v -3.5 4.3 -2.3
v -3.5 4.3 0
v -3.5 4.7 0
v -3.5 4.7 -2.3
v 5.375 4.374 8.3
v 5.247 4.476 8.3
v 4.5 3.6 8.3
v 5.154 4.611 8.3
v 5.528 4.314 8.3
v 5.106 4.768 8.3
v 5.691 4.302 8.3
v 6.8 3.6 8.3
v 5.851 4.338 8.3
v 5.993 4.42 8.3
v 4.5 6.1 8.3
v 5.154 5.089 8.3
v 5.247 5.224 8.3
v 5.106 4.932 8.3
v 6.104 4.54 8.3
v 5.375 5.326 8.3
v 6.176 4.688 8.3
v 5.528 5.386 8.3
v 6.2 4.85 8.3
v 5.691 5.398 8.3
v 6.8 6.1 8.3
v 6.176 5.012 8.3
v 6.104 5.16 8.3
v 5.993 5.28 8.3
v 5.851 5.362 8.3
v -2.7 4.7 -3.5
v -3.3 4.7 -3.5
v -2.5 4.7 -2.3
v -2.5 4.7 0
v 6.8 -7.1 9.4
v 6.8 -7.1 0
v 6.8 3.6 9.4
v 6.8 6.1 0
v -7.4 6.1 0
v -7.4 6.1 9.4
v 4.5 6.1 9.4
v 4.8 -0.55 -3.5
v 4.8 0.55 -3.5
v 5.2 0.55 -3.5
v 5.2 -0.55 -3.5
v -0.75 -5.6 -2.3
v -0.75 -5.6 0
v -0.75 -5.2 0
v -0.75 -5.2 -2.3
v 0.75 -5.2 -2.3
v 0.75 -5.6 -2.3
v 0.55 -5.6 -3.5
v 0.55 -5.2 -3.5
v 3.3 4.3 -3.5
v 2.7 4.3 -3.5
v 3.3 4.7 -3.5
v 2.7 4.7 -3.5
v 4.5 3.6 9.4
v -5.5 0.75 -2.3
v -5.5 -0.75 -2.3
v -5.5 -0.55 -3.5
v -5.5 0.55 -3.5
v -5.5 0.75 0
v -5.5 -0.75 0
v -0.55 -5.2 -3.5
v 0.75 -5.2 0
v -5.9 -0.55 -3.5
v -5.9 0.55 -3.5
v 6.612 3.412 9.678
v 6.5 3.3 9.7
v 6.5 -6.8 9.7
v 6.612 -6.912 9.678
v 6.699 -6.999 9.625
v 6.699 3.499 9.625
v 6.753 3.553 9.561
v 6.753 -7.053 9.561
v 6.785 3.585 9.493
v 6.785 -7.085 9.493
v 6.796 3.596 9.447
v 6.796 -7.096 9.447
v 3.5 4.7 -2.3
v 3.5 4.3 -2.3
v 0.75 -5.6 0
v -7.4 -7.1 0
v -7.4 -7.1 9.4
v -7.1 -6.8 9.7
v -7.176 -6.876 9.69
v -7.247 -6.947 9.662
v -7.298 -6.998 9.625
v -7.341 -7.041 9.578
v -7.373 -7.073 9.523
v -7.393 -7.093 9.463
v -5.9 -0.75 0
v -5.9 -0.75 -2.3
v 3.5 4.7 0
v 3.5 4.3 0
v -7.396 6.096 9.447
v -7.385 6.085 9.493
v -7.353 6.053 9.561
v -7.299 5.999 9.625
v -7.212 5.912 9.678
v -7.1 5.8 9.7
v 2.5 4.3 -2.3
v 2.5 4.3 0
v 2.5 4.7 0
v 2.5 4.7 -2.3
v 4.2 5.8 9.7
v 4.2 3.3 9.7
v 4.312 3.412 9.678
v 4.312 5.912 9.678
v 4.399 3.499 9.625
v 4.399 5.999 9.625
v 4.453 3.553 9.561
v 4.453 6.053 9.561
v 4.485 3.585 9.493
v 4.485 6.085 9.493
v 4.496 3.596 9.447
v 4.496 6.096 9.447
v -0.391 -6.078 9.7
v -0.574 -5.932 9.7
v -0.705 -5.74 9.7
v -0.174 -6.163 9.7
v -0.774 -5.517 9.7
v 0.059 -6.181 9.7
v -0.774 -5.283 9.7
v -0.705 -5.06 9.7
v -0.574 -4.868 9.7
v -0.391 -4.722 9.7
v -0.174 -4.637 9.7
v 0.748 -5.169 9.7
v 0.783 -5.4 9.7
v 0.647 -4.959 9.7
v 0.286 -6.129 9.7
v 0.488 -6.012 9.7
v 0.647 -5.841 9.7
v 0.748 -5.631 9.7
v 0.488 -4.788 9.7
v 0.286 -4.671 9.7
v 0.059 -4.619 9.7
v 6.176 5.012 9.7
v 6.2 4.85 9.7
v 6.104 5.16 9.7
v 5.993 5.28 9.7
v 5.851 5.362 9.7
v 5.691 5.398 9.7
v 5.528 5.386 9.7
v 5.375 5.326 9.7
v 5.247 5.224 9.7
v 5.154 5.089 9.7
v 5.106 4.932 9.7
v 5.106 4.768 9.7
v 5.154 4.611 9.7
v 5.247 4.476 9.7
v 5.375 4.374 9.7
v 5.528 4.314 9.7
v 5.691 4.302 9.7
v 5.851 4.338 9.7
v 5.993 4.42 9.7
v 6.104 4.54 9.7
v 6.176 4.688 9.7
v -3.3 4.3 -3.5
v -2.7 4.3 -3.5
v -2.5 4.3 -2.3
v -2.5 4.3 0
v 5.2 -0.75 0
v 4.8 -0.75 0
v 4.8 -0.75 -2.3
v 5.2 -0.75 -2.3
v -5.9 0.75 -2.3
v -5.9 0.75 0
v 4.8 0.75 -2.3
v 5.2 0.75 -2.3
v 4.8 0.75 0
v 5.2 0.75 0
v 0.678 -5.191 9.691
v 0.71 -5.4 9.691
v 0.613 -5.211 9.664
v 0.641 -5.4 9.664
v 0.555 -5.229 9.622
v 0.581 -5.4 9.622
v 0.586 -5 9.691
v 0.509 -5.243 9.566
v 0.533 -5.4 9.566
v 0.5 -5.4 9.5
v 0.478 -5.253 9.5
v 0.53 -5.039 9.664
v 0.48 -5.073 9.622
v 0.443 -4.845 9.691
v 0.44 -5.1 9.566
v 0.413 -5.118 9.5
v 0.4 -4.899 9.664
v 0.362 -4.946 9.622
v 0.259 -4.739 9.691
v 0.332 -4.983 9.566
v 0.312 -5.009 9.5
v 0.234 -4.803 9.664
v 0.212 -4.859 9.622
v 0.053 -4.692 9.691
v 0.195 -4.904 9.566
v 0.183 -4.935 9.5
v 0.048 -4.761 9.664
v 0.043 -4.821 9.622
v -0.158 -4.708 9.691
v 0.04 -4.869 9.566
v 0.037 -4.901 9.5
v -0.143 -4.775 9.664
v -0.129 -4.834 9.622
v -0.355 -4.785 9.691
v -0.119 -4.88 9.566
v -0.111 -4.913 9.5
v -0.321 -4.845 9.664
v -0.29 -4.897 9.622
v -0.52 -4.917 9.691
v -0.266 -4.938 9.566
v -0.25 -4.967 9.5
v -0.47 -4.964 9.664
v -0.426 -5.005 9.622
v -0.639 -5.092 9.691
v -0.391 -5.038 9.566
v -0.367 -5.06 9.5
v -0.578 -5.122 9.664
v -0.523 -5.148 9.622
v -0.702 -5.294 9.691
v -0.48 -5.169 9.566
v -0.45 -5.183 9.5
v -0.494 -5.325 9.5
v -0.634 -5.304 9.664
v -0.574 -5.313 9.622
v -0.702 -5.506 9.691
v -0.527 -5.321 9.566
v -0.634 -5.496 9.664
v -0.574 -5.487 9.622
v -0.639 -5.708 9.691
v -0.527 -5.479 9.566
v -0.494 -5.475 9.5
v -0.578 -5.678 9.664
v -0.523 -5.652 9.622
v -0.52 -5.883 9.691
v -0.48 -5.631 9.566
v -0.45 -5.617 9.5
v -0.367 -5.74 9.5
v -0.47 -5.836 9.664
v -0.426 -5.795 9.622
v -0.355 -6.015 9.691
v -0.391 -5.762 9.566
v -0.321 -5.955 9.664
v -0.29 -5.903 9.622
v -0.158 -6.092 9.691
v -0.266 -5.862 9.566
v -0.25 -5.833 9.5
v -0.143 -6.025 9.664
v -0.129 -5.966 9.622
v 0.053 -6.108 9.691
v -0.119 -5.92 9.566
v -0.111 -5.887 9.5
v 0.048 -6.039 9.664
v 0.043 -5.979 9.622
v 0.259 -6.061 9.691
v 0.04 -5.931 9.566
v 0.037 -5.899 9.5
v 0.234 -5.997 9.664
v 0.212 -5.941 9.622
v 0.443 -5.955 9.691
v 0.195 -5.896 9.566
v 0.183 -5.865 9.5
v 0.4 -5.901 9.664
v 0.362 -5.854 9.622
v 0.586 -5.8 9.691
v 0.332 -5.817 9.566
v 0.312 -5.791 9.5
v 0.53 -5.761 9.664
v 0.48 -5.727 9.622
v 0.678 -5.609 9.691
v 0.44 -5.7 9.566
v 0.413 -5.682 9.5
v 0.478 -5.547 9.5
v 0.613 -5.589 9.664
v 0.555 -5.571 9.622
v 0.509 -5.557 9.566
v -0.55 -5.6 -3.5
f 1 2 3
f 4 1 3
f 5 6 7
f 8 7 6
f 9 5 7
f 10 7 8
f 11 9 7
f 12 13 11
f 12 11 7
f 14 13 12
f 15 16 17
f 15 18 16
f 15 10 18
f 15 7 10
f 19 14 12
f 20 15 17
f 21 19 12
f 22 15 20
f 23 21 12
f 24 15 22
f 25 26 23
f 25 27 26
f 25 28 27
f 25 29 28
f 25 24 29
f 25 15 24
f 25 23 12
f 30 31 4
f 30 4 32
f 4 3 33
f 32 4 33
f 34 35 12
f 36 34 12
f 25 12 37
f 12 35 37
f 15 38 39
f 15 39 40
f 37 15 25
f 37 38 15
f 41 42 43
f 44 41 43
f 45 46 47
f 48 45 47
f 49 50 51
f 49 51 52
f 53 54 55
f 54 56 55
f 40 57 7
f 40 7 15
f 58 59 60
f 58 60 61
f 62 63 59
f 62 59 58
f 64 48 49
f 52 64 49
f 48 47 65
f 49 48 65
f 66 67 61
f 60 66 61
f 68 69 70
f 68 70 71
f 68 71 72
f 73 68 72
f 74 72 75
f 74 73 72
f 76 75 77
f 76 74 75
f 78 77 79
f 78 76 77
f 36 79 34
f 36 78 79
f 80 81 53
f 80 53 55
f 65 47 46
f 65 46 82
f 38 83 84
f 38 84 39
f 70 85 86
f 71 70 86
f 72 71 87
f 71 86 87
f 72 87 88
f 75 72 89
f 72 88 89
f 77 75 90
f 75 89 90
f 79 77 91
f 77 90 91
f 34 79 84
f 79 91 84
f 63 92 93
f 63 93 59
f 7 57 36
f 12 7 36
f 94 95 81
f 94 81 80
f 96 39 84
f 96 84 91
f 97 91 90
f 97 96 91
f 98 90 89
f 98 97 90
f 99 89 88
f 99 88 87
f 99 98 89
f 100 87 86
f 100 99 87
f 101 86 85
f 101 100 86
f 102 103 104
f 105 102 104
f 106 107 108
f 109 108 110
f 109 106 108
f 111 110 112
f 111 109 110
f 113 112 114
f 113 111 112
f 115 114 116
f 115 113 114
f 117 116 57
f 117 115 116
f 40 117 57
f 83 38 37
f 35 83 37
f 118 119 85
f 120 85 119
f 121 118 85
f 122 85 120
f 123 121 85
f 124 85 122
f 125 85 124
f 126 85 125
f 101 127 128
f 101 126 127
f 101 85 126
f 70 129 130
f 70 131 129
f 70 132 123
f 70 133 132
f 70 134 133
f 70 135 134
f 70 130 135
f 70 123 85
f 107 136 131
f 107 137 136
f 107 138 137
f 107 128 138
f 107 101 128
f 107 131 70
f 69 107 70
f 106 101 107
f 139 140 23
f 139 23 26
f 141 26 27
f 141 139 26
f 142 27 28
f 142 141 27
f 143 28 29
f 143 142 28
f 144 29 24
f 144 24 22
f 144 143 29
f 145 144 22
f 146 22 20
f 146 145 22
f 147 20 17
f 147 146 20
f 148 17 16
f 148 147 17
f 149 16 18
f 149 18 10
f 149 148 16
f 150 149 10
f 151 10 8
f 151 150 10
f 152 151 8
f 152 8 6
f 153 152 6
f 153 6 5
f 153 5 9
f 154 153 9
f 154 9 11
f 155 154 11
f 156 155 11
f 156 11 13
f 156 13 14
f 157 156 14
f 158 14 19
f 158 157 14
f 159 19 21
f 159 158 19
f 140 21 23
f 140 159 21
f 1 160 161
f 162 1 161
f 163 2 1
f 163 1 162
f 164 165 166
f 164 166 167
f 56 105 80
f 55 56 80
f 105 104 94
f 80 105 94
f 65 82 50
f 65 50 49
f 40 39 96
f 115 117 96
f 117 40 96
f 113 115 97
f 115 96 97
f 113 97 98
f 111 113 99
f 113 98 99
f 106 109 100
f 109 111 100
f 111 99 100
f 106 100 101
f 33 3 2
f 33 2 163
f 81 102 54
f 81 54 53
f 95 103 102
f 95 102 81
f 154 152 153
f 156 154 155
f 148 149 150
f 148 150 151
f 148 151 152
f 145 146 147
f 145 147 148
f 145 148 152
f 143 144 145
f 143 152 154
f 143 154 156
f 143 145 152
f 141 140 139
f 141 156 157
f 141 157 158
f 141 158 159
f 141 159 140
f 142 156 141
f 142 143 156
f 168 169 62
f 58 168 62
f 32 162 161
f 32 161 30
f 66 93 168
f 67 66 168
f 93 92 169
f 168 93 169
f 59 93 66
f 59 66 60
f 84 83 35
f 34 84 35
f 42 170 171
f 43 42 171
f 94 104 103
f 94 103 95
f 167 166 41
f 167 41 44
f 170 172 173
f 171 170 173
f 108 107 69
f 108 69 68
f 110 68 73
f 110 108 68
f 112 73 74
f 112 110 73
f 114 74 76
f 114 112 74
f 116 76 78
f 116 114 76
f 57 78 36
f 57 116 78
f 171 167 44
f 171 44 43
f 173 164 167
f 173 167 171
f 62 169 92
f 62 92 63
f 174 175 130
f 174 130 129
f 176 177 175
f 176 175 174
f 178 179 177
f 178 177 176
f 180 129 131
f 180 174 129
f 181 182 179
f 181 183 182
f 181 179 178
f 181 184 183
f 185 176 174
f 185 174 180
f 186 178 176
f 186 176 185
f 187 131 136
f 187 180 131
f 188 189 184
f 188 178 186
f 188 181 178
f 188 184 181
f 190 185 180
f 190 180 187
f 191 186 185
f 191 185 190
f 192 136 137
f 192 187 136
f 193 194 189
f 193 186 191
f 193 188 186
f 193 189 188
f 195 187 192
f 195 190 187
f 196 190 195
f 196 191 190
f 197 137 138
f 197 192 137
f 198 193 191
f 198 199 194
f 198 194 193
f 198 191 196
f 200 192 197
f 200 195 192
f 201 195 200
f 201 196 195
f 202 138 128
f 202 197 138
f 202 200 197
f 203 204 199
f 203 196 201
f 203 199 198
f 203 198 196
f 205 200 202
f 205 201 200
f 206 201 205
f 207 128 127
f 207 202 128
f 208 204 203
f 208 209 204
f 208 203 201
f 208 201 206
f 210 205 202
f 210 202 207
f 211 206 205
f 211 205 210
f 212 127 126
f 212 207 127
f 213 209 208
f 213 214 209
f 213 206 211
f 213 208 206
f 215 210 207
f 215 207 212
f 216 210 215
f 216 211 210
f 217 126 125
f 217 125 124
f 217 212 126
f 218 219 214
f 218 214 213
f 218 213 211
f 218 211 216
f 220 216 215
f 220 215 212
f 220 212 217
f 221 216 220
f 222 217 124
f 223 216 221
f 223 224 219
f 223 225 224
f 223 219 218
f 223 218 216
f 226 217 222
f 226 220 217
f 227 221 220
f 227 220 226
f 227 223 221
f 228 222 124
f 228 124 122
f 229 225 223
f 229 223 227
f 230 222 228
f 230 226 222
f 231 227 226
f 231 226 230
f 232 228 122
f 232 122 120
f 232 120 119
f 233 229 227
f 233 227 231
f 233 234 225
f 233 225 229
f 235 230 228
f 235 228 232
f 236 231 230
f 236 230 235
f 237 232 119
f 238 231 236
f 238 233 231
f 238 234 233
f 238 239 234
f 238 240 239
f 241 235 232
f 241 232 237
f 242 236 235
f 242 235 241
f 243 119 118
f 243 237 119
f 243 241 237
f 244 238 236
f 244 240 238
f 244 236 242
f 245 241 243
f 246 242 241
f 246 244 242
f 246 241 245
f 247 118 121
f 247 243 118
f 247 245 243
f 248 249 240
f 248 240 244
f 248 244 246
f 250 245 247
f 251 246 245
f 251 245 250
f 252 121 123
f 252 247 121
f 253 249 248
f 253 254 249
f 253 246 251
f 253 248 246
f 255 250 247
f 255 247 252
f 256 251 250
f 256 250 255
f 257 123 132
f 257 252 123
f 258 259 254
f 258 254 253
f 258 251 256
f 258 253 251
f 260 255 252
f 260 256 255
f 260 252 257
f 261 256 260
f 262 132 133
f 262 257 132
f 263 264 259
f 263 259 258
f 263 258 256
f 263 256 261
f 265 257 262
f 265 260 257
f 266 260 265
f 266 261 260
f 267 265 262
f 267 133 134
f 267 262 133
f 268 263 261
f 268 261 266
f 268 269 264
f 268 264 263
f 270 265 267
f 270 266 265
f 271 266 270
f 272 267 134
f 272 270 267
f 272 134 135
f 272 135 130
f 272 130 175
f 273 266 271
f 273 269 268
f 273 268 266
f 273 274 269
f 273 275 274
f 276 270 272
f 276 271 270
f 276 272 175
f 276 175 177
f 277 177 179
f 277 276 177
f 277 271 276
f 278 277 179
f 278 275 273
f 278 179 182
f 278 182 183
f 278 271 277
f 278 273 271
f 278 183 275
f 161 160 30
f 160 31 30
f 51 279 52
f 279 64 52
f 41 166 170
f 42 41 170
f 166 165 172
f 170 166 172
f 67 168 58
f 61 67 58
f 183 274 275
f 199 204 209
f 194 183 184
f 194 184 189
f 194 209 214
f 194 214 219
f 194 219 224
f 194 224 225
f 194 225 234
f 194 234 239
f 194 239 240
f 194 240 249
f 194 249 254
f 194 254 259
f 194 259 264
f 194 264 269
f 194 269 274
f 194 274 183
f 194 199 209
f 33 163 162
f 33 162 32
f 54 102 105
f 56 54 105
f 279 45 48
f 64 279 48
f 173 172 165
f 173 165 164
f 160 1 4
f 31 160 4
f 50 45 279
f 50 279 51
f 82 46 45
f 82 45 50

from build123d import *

# Parameters (mm, degrees)
F1_W         = 14.2
F1_H         = 13.2
F2_DEPTH     = 9.7
F0_W         = 0.4
F0_H         = 1.5
F3_DEPTH     = 3.5
F0_W_2       = 1.5
F0_H_2       = 0.4
F0_W_3       = 1
F4_W         = 2.3
F4_H         = 2.5
F4_R         = 0.55
F5_DEPTH     = 1.4
F4_R_2       = 0.5
F6_DEPTH     = 0.2
F7_T1_DEPTH  = 3.25
F7_T3_DEPTH  = 13.4
F7_T5_DEPTH  = 3.05
F7_T7_DEPTH  = 14.7
F7_T9_DEPTH  = 12.2
F7_T11_DEPTH = 15.7
F7_T19_DEPTH = 3.25
F7_T23_DEPTH = 3.05
F8_SIZE2     = 1.2
F8_SIZE      = 0.2
F8_2_SIZE2   = 1.2
F8_2_SIZE    = 0.2
F8_3_SIZE2   = 1.2
F8_3_SIZE    = 0.2
F8_4_SIZE2   = 1.2
F8_4_SIZE    = 0.2
F8_5_SIZE2   = 1.2
F8_5_SIZE    = 0.2


# Not quite as in the source:
# - a fillet or chamfer that OpenCascade refuses, or shapes differently, is made with other operations: its cross-section is extruded or revolved along the edge and cut away or added


with BuildPart() as f2:
    # F1 (on Top) → F2 (new body)
    with BuildSketch(Plane.XY):
        with Locations((-0.3, -0.5)):
            Rectangle(F1_W, F1_H)
    extrude(amount=F2_DEPTH)

    # F4 (on face) → F5 (cut)
    with BuildSketch(Plane.XY.offset(9.7)):
        with Locations((5.65, 4.85)):
            Rectangle(F4_W, F4_H)
        with Locations((5.65, 4.85)):
            Circle(F4_R, mode=Mode.SUBTRACT)
    extrude(amount=-F5_DEPTH, mode=Mode.SUBTRACT)

    # F4 (on face) → F6 (cut)
    with BuildSketch(Plane.XY.offset(9.7)):
        with Locations((0, -5.4)):
            Circle(F4_R_2)
    extrude(amount=-F6_DEPTH, mode=Mode.SUBTRACT)

    # F7: fillet of radius 0.3 on 7 edges, made by hand

    # F7_s2 → F7_t1 (cut)
    with BuildSketch(Plane.XZ.offset(-6.85)):
        with BuildLine():
            ThreePointArc((4.2, 9.7), (4.4121320344, 9.6121320344), (4.5, 9.4))
            Line((4.5, 9.4), (4.5, 9.7))
            Line((4.5, 9.7), (4.2, 9.7))
        make_face()
    extrude(amount=F7_T1_DEPTH, mode=Mode.SUBTRACT)

    # F7_s4 → F7_t3 (cut)
    with BuildSketch(Plane.YZ.offset(-8.15)):
        with BuildLine():
            ThreePointArc((6.1, 9.4), (6.0121320344, 9.6121320344), (5.8, 9.7))
            Line((5.8, 9.7), (6.1, 9.7))
            Line((6.1, 9.7), (6.1, 9.4))
        make_face()
    extrude(amount=F7_T3_DEPTH, mode=Mode.SUBTRACT)

    # F7_s6 → F7_t5 (cut)
    with BuildSketch(Plane.YZ.offset(4.5)):
        with BuildLine():
            ThreePointArc((3.3, 9.7), (3.5121320344, 9.6121320344), (3.6, 9.4))
            Line((3.6, 9.4), (3.6, 9.7))
            Line((3.6, 9.7), (3.3, 9.7))
        make_face()
    extrude(amount=F7_T5_DEPTH, mode=Mode.SUBTRACT)

    # F7_s8 → F7_t7 (cut)
    with BuildSketch(Plane.XZ.offset(-6.85)):
        with BuildLine():
            ThreePointArc((-7.4, 9.4), (-7.3121320344, 9.6121320344), (-7.1, 9.7))
            Line((-7.1, 9.7), (-7.4, 9.7))
            Line((-7.4, 9.7), (-7.4, 9.4))
        make_face()
    extrude(amount=F7_T7_DEPTH, mode=Mode.SUBTRACT)

    # F7_s10 → F7_t9 (cut)
    with BuildSketch(Plane.XZ.offset(-4.35)):
        with BuildLine():
            ThreePointArc((6.5, 9.7), (6.7121320344, 9.6121320344), (6.8, 9.4))
            Line((6.8, 9.4), (6.8, 9.7))
            Line((6.8, 9.7), (6.5, 9.7))
        make_face()
    extrude(amount=F7_T9_DEPTH, mode=Mode.SUBTRACT)

    # F7_s12 → F7_t11 (cut)
    with BuildSketch(Plane.YZ.offset(-8.15)):
        with BuildLine():
            ThreePointArc((-6.8, 9.7), (-7.0121320344, 9.6121320344), (-7.1, 9.4))
            Line((-7.1, 9.4), (-7.1, 9.7))
            Line((-7.1, 9.7), (-6.8, 9.7))
        make_face()
    extrude(amount=F7_T11_DEPTH, mode=Mode.SUBTRACT)

    # F7_s13 → F7_t14 (revolve, cut)
    with BuildSketch(Plane.XZ.offset(5.4)):
        with BuildLine():
            ThreePointArc((0.7828427125, 9.7), (0.6096376317, 9.6449489743), (0.5, 9.5))
            Line((0.5, 9.5), (0.5, 9.7))
            Line((0.5, 9.7), (0.7828427125, 9.7))
        make_face()
    revolve(axis=Axis((0, -5.4, 9.7), (0, 0, 1)), mode=Mode.SUBTRACT)


with BuildPart() as f3:
    # F0 (on Top) → F3 (new body)
    with BuildSketch(Plane.XY):
        with Locations((-5.7, 0)):
            Rectangle(F0_W, F0_H)
    extrude(amount=-F3_DEPTH)

    # F8
    f8_edges = [f3.edges().sort_by_distance(p)[0] for p in [
        (-5.7, -0.75, -3.5),
        (-5.7, 0.75, -3.5),
    ]]
    f8_side = f3.faces().sort_by_distance((-5.7, 0, -3.5))[0]
    chamfer(f8_edges, length=F8_SIZE, length2=F8_SIZE2, reference=f8_side)


with BuildPart() as f3b:
    # F0 (on Top) → F3, piece 2 (new body)
    with BuildSketch(Plane.XY):
        with Locations((5, 0)):
            Rectangle(F0_W, F0_H)
    extrude(amount=-F3_DEPTH)

    # F8#5
    f8_5_edges = [f3b.edges().sort_by_distance(p)[0] for p in [
        (5, -0.75, -3.5),
        (5, 0.75, -3.5),
    ]]
    f8_5_side = f3b.faces().sort_by_distance((5, 0, -3.5))[0]
    chamfer(f8_5_edges, length=F8_5_SIZE, length2=F8_5_SIZE2, reference=f8_5_side)


with BuildPart() as f3c:
    # F0 (on Top) → F3, piece 3 (new body)
    with BuildSketch(Plane.XY):
        with Locations((0, -5.4)):
            Rectangle(F0_W_2, F0_H_2)
    extrude(amount=-F3_DEPTH)

    # F8#2
    f8_2_edges = [f3c.edges().sort_by_distance(p)[0] for p in [
        (0.75, -5.4, -3.5),
        (-0.75, -5.4, -3.5),
    ]]
    f8_2_side = f3c.faces().sort_by_distance((0, -5.4, -3.5))[0]
    chamfer(f8_2_edges, length=F8_2_SIZE, length2=F8_2_SIZE2, reference=f8_2_side)


with BuildPart() as f3d:
    # F0 (on Top) → F3, piece 4 (new body)
    with BuildSketch(Plane.XY):
        with Locations((-3, 4.5)):
            Rectangle(F0_W_3, F0_H_2)
    extrude(amount=-F3_DEPTH)

    # F8#3
    f8_3_edges = [f3d.edges().sort_by_distance(p)[0] for p in [
        (-2.5, 4.5, -3.5),
        (-3.5, 4.5, -3.5),
    ]]
    f8_3_side = f3d.faces().sort_by_distance((-3, 4.5, -3.5))[0]
    chamfer(f8_3_edges, length=F8_3_SIZE, length2=F8_3_SIZE2, reference=f8_3_side)


with BuildPart() as f3e:
    # F0 (on Top) → F3, piece 5 (new body)
    with BuildSketch(Plane.XY):
        with Locations((3, 4.5)):
            Rectangle(F0_W_3, F0_H_2)
    extrude(amount=-F3_DEPTH)

    # F8#4
    f8_4_edges = [f3e.edges().sort_by_distance(p)[0] for p in [
        (2.5, 4.5, -3.5),
        (3.5, 4.5, -3.5),
    ]]
    f8_4_side = f3e.faces().sort_by_distance((3, 4.5, -3.5))[0]
    chamfer(f8_4_edges, length=F8_4_SIZE, length2=F8_4_SIZE2, reference=f8_4_side)


with BuildPart() as f7_tool17:
    # F7_s18 → F7_t19 (new body)
    with BuildSketch(Plane.XZ.offset(-6.1)):
        with BuildLine():
            ThreePointArc((4.2, 9.7), (4.4121320344, 9.6121320344), (4.5, 9.4))
            Line((4.5, 9.4), (4.5, 9.7))
            Line((4.5, 9.7), (4.2, 9.7))
        make_face()
    extrude(amount=F7_T19_DEPTH)

    split(bisect_by=Plane.XZ.offset(-3.6), keep=Keep.TOP)


with BuildPart() as f7_tool21:
    # F7_s22 → F7_t23 (new body)
    with BuildSketch(Plane.YZ.offset(3.75)):
        with BuildLine():
            ThreePointArc((3.3, 9.7), (3.5121320344, 9.6121320344), (3.6, 9.4))
            Line((3.6, 9.4), (3.6, 9.7))
            Line((3.6, 9.7), (3.3, 9.7))
        make_face()
    extrude(amount=F7_T23_DEPTH)

    split(bisect_by=Plane.YZ.offset(4.5), keep=Keep.BOTTOM)


with BuildPart() as f7_tool17_1:
    add(f7_tool17.part)

    # F7_t25: intersect F7_tool21
    add(f7_tool21.part, mode=Mode.INTERSECT)


with BuildPart() as f2_1:
    add(f2.part)

    # F7_t15: cut F7_tool17
    add(f7_tool17_1.part, mode=Mode.SUBTRACT)


solid = Compound([f3.part, f3b.part, f3c.part, f3d.part, f3e.part, f2_1.part])
